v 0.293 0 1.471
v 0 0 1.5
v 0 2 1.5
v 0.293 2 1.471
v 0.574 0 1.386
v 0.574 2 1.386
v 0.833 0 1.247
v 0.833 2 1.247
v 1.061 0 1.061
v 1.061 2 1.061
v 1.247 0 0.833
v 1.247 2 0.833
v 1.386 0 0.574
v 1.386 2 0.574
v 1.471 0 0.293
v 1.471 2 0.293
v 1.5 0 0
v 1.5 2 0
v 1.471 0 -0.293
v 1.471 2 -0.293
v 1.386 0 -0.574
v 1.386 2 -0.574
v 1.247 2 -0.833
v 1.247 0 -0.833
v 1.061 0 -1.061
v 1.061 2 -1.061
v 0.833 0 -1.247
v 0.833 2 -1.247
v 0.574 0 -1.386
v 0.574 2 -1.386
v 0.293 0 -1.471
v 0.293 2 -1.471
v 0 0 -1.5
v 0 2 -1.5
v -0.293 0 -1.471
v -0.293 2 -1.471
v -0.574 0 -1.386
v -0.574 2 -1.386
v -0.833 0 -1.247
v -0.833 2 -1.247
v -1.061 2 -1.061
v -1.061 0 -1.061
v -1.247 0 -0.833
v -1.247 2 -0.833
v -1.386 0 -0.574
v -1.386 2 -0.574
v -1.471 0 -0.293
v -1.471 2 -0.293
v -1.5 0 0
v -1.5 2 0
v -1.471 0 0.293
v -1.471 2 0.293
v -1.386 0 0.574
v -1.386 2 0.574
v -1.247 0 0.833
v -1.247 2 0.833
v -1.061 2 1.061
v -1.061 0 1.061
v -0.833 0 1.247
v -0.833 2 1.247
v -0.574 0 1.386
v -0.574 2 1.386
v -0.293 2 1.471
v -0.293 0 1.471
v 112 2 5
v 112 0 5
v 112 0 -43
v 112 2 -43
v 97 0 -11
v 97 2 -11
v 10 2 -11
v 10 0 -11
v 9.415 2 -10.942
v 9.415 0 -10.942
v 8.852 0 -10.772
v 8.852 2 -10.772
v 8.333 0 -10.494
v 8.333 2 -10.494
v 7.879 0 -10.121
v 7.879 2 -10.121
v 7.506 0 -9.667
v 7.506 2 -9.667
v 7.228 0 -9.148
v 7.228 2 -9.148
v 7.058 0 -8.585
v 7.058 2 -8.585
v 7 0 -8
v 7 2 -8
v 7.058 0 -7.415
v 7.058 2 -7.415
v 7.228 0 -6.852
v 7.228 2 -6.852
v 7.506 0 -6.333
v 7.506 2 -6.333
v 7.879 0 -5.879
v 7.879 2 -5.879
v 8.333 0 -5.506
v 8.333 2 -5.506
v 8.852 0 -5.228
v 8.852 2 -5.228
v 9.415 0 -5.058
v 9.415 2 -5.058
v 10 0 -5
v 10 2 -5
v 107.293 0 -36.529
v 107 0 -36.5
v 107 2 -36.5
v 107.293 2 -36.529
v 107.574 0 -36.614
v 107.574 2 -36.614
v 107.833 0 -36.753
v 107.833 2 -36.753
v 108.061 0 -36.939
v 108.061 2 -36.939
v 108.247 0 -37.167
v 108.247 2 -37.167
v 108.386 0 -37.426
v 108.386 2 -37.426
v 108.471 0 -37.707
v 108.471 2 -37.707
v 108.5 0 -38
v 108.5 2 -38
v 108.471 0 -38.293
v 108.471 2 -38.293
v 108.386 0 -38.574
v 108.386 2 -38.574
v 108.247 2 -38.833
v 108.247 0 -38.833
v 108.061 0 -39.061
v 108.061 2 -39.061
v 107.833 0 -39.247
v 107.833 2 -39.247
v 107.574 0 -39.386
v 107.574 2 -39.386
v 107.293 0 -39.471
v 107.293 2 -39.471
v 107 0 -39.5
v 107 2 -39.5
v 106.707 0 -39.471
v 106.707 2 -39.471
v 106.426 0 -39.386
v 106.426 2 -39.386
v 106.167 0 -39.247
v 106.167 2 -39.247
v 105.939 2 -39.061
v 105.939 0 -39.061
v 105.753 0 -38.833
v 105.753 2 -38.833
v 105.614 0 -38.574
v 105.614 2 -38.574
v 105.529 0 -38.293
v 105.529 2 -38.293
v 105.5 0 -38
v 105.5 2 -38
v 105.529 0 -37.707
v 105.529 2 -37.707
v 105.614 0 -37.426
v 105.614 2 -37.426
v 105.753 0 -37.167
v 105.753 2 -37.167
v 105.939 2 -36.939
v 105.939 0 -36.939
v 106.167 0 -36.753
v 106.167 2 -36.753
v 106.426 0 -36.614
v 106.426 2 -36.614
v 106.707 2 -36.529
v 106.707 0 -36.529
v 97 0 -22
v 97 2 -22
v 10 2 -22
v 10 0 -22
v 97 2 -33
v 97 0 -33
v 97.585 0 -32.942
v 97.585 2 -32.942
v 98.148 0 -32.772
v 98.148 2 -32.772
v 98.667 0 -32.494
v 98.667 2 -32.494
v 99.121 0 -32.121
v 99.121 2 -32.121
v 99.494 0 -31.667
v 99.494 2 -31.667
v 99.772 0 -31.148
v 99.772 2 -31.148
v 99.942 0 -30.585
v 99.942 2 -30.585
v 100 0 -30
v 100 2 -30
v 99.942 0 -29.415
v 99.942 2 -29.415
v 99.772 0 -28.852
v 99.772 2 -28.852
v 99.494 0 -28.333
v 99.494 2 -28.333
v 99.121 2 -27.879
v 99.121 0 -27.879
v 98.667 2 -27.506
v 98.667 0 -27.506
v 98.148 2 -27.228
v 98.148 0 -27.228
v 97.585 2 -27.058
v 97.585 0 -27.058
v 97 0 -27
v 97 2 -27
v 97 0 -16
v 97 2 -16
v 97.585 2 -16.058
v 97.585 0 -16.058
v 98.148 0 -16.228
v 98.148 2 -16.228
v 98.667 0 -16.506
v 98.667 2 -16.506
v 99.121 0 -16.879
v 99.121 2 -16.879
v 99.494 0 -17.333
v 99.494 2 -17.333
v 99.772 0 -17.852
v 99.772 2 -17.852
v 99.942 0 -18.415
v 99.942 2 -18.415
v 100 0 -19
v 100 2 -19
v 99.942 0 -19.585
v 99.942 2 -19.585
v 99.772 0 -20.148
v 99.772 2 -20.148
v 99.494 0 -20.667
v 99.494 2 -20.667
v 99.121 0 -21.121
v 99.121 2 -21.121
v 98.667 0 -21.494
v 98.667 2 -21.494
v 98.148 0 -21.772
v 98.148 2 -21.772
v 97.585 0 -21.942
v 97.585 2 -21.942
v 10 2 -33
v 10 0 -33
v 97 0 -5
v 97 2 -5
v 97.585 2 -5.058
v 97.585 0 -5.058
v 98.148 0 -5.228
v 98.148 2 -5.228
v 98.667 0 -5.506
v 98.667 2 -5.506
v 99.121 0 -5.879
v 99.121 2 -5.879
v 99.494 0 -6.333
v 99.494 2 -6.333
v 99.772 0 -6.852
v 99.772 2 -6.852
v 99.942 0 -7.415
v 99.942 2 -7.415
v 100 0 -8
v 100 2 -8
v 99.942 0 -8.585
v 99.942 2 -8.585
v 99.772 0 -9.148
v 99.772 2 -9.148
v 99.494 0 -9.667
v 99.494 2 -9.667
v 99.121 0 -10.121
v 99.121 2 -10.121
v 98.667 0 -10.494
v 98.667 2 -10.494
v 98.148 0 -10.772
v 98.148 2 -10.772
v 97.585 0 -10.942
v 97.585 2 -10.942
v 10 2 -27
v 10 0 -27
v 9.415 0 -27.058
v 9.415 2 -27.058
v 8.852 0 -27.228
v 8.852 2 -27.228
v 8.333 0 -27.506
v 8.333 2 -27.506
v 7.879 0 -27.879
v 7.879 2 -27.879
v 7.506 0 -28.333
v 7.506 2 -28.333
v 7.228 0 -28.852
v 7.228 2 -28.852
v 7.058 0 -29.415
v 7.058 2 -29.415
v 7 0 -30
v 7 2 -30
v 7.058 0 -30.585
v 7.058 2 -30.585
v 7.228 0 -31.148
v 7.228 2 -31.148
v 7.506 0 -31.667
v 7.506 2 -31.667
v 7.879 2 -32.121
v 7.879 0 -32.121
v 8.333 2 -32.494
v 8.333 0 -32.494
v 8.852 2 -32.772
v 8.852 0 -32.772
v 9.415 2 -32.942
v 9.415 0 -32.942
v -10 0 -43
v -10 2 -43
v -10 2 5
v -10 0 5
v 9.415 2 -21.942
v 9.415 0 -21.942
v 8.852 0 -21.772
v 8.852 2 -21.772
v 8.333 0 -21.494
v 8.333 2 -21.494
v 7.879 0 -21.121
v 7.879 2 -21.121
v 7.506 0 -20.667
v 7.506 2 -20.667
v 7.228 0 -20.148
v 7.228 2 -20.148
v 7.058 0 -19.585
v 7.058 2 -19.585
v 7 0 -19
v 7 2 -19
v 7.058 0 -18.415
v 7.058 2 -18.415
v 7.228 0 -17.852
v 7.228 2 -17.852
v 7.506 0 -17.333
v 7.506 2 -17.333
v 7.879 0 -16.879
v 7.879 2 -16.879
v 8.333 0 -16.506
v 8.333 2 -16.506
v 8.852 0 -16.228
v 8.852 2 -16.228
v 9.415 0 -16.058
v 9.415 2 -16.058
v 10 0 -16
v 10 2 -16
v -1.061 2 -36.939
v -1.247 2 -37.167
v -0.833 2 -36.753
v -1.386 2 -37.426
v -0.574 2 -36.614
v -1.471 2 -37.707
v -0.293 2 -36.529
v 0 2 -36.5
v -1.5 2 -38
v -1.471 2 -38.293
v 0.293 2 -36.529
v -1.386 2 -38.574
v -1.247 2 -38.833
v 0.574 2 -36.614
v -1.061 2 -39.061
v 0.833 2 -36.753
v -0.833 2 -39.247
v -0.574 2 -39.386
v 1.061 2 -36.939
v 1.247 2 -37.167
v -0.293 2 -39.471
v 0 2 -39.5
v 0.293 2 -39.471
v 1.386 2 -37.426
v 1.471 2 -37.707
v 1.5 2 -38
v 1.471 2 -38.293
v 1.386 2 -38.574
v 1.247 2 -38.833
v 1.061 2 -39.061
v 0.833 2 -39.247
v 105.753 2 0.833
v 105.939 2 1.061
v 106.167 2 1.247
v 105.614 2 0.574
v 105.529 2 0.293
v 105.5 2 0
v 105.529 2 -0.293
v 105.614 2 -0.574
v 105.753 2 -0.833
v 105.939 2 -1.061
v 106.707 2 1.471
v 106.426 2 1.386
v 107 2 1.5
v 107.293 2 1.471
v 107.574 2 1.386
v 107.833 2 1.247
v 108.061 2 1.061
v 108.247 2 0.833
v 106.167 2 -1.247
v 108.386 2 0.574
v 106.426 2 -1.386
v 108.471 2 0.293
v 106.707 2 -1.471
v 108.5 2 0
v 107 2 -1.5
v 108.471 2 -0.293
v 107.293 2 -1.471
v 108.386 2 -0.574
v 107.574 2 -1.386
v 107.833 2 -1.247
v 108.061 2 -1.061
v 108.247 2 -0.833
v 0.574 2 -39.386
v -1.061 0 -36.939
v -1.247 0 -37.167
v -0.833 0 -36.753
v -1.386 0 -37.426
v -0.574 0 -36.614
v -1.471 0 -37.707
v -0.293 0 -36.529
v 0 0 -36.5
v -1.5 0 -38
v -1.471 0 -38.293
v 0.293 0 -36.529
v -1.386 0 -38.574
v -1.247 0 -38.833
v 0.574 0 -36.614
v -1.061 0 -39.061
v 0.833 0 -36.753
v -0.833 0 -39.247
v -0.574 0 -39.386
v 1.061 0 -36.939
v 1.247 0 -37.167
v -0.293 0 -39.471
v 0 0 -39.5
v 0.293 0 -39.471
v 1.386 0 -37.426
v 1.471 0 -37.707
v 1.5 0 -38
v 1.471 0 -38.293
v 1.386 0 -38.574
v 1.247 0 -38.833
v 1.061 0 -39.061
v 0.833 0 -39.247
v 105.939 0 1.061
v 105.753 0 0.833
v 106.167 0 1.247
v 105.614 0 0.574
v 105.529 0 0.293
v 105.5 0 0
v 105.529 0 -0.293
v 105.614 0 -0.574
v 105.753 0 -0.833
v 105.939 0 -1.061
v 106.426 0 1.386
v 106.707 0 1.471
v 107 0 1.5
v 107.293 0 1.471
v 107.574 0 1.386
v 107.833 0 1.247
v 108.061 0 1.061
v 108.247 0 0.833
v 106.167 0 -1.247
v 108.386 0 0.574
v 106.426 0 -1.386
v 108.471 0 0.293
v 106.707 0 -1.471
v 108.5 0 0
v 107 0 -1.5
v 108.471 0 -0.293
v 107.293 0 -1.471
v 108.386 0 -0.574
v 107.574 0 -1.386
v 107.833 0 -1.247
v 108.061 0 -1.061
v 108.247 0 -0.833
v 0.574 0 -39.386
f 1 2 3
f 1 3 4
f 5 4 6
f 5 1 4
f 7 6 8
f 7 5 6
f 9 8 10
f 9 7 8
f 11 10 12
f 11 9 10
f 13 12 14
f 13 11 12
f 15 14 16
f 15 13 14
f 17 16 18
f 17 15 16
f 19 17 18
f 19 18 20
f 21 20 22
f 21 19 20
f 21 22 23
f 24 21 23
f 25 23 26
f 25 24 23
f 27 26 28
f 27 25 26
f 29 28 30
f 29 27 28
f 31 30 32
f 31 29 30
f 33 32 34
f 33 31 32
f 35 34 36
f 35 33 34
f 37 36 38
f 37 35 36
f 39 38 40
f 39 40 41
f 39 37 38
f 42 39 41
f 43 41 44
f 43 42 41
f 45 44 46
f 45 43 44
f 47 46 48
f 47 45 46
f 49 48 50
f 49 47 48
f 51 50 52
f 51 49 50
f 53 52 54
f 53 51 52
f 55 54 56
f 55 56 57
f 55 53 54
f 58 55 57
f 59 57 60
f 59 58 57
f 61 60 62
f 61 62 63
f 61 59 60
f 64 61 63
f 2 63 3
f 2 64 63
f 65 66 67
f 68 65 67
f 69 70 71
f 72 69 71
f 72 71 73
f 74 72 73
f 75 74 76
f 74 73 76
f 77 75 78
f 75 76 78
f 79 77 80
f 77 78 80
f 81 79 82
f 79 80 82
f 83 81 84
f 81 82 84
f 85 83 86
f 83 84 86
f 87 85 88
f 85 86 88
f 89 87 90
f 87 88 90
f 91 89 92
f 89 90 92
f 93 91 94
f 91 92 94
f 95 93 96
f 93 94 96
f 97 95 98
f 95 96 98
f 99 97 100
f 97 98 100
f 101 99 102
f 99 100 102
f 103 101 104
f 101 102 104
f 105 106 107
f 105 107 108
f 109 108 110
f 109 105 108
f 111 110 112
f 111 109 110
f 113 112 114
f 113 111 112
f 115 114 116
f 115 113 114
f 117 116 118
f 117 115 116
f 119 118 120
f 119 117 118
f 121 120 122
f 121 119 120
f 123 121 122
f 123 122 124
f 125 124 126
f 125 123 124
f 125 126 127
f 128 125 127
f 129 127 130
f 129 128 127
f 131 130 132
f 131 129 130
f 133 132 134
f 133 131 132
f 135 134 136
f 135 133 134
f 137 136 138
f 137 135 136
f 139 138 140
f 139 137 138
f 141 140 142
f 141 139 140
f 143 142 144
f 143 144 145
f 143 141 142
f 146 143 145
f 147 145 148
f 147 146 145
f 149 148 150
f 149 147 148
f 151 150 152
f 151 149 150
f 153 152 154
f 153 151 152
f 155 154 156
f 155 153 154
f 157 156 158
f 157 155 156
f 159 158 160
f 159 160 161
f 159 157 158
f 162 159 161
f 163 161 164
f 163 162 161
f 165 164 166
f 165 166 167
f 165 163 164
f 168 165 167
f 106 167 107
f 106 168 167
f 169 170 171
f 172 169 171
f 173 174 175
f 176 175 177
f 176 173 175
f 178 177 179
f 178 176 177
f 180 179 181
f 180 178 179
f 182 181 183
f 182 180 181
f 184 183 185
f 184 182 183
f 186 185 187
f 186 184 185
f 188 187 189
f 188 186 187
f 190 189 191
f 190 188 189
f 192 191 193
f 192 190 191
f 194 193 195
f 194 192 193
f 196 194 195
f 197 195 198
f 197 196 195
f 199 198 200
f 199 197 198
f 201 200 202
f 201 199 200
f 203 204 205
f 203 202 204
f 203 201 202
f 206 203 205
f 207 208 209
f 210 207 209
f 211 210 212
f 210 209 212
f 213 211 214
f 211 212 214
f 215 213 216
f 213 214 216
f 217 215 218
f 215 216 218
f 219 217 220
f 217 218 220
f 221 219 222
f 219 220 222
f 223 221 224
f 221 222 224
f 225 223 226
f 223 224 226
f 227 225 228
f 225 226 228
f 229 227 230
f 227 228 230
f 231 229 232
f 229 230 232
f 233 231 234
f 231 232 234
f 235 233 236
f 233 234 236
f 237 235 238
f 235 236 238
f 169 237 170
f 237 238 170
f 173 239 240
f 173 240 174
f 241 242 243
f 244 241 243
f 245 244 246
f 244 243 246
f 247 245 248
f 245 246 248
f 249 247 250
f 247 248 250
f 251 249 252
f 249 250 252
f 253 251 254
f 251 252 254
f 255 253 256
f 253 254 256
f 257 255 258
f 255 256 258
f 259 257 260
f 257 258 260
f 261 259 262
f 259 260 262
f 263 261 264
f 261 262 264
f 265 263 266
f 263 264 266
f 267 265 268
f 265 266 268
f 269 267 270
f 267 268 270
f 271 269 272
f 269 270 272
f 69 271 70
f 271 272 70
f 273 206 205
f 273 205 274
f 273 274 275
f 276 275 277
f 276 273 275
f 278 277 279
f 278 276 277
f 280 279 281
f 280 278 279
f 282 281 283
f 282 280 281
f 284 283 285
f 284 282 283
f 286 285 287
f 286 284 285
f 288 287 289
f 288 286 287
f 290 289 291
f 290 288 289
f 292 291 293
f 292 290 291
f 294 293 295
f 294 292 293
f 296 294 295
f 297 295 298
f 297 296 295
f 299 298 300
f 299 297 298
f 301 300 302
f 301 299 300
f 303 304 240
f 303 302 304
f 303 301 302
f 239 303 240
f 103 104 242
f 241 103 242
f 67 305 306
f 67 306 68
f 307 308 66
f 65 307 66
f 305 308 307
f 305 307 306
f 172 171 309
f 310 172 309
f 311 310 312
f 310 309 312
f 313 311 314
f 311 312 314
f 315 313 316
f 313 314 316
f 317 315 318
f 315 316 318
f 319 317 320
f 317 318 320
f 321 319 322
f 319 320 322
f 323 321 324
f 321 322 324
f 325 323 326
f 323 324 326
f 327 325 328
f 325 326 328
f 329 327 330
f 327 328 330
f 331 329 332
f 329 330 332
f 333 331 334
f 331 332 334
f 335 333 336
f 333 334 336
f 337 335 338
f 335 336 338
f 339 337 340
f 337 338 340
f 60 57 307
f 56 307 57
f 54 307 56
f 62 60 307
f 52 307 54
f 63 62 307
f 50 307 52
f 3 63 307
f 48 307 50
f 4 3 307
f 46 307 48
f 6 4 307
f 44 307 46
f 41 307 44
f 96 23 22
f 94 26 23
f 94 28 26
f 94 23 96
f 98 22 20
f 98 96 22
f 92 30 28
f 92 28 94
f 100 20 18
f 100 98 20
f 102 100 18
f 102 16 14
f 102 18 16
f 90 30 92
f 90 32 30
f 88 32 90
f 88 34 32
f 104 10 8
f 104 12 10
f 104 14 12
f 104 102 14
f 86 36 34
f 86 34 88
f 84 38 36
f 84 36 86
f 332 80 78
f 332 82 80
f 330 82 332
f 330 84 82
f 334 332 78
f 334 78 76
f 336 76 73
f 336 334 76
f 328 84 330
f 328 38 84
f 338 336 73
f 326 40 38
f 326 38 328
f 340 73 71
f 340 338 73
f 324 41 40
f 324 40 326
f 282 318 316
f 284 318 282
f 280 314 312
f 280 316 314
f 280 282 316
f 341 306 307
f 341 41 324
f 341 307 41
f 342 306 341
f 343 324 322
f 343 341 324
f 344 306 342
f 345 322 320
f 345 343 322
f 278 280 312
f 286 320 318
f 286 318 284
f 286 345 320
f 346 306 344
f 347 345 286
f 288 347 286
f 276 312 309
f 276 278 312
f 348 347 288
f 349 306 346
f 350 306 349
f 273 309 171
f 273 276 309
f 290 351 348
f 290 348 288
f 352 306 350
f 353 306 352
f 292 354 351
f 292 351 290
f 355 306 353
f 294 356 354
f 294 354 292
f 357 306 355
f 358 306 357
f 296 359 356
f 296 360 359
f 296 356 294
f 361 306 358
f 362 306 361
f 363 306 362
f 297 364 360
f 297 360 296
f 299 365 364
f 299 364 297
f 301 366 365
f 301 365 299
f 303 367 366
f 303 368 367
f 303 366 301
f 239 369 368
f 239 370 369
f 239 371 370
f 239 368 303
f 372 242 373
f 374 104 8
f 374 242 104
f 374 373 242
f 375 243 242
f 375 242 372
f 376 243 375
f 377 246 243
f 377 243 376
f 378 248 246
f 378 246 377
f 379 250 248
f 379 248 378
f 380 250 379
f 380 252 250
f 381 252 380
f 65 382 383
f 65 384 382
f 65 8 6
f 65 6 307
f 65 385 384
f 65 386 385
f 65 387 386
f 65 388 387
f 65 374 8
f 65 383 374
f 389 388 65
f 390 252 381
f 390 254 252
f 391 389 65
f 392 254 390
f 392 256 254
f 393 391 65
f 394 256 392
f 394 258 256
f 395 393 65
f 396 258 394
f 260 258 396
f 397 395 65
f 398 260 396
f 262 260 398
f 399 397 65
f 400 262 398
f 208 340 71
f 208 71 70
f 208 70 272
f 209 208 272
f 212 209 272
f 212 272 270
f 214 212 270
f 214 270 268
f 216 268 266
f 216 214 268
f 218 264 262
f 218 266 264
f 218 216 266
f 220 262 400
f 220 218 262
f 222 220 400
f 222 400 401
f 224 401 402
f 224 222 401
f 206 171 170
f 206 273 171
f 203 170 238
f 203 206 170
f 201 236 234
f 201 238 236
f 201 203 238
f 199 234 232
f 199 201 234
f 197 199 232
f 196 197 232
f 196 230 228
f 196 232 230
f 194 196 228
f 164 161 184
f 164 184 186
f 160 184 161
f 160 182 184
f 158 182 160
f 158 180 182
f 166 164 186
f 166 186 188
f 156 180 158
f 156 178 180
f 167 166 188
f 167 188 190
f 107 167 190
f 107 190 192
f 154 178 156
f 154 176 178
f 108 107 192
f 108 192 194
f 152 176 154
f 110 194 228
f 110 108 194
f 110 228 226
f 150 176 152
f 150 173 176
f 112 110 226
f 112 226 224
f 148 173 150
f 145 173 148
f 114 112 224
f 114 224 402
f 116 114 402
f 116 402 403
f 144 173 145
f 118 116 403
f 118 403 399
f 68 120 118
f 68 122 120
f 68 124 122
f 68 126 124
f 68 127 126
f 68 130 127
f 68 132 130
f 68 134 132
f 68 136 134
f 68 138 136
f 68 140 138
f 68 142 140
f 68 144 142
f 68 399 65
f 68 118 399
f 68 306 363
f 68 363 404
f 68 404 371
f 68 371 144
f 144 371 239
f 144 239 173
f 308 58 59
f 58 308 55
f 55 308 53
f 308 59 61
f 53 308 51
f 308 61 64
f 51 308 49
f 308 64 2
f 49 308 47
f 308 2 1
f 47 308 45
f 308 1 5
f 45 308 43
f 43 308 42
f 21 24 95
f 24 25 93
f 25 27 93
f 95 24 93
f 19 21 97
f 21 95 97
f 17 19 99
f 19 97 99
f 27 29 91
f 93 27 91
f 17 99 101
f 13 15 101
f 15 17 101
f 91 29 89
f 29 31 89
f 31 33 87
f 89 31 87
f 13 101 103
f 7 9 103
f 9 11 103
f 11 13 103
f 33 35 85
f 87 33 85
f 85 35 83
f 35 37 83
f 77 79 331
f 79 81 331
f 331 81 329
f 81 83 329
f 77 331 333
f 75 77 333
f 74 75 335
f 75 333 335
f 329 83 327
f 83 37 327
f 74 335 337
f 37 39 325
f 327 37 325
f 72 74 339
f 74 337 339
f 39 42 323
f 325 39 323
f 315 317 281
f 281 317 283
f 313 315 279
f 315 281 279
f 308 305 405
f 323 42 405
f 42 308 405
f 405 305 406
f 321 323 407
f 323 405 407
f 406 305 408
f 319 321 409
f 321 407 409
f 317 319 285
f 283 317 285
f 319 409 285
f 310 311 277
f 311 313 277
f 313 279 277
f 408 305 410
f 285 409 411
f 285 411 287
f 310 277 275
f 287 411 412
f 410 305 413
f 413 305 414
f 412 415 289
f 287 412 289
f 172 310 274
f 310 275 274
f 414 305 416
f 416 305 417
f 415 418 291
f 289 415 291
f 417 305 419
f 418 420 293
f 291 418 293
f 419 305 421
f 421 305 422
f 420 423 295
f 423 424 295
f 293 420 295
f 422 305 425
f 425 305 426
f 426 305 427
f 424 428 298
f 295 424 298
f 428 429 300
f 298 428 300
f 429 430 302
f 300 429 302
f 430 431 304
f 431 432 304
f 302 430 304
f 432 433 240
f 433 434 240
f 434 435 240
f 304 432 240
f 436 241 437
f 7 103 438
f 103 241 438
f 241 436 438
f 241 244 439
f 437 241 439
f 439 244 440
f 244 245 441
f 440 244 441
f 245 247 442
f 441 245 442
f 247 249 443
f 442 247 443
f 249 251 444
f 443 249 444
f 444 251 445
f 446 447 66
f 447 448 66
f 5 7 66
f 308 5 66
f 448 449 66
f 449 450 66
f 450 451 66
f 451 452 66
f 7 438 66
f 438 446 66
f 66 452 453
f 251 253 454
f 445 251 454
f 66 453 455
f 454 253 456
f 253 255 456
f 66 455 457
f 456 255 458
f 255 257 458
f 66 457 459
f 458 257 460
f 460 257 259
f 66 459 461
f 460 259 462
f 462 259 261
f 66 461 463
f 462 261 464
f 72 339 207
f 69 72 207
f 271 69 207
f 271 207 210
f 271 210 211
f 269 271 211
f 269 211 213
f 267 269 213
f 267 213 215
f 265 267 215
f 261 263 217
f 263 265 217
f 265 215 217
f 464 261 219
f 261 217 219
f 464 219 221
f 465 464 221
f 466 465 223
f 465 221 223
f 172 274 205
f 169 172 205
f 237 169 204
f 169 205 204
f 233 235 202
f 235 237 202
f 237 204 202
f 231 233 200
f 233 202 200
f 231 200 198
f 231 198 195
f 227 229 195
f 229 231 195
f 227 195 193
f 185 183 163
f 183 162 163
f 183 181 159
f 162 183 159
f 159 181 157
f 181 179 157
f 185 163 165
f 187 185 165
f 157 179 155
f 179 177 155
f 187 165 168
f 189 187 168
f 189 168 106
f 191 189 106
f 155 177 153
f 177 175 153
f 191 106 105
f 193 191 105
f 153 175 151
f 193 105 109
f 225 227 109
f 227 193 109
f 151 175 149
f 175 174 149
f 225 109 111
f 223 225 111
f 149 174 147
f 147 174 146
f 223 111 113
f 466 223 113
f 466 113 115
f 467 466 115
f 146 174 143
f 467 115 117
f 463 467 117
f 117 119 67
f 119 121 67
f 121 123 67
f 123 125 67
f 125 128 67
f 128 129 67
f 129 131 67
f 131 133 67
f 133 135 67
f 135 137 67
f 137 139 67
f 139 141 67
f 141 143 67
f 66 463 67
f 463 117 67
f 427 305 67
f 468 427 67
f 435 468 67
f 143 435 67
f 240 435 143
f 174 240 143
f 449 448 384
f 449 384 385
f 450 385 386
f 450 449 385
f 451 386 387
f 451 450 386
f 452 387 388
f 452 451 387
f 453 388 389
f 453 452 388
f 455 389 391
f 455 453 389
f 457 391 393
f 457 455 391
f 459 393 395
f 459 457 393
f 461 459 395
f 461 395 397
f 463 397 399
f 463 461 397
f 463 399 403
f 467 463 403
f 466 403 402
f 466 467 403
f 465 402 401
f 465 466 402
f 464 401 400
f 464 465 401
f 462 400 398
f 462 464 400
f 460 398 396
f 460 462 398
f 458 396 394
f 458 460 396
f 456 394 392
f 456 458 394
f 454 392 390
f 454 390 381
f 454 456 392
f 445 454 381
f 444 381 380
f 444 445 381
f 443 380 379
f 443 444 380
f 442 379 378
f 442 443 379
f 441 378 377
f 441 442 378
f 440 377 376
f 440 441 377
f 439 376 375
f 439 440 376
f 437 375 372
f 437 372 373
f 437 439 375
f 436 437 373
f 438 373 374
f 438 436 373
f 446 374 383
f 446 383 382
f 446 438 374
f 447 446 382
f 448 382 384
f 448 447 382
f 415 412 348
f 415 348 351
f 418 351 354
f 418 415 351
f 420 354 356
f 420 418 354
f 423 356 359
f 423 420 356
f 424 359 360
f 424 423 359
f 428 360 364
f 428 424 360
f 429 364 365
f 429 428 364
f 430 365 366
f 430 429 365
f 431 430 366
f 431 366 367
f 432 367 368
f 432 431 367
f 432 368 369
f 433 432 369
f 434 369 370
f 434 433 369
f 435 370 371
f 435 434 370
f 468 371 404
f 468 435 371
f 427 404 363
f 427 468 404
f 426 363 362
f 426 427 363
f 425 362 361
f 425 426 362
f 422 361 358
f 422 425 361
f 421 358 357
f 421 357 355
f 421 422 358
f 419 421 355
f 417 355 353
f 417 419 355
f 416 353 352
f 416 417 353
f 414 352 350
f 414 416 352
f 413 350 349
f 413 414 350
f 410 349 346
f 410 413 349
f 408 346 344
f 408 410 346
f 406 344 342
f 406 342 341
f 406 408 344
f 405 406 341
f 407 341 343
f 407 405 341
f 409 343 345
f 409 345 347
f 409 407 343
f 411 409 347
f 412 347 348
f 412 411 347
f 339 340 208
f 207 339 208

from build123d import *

# Parameters (mm, degrees)
SKETCH_1_W          = 122
SKETCH_1_H          = 48
SKETCH_1_R          = 1.5
EXTRUDE_1_DEPTH     = 2
CUT_EXTRUDE_1_DEPTH = 120.987499349


with BuildPart() as part:
    # 草图1 → 凸台-拉伸1 (new body)
    with BuildSketch(Plane(origin=(0, 0, 0), x_dir=(1, 0, 0), z_dir=(0, 1, 0))):
        with Locations((51, 19)):
            Rectangle(SKETCH_1_W, SKETCH_1_H)
        with Locations(Location((0, 38, 0), (0, 0, 270))):
            Circle(SKETCH_1_R, mode=Mode.SUBTRACT)
        with Locations(Location((0, 0, 0), (0, 0, 270))):
            Circle(SKETCH_1_R, mode=Mode.SUBTRACT)
        with Locations(Location((107, 38, 0), (0, 0, 270))):
            Circle(SKETCH_1_R, mode=Mode.SUBTRACT)
        with Locations(Location((107, 0, 0), (0, 0, 270))):
            Circle(SKETCH_1_R, mode=Mode.SUBTRACT)
    extrude(amount=EXTRUDE_1_DEPTH)

    # 草图2 → 切除-拉伸1 (cut, through all)
    with BuildSketch(Plane(origin=(0, 2, 0), x_dir=(1, 0, 0), z_dir=(0, 1, 0))):
        with BuildLine():
            Line((10, 33), (97, 33))
            ThreePointArc((97, 33), (100, 30), (97, 27))
            Line((97, 27), (10, 27))
            ThreePointArc((10, 27), (7, 30), (10, 33))
        make_face()
        with BuildLine():
            Line((10, 16), (97, 16))
            ThreePointArc((97, 16), (100, 19), (97, 22))
            Line((97, 22), (10, 22))
            ThreePointArc((10, 22), (7, 19), (10, 16))
        make_face()
        with BuildLine():
            Line((10, 5), (97, 5))
            ThreePointArc((97, 5), (100, 8), (97, 11))
            Line((97, 11), (10, 11))
            ThreePointArc((10, 11), (7, 8), (10, 5))
        make_face()
    extrude(amount=-CUT_EXTRUDE_1_DEPTH, mode=Mode.SUBTRACT)


solid = part.part
